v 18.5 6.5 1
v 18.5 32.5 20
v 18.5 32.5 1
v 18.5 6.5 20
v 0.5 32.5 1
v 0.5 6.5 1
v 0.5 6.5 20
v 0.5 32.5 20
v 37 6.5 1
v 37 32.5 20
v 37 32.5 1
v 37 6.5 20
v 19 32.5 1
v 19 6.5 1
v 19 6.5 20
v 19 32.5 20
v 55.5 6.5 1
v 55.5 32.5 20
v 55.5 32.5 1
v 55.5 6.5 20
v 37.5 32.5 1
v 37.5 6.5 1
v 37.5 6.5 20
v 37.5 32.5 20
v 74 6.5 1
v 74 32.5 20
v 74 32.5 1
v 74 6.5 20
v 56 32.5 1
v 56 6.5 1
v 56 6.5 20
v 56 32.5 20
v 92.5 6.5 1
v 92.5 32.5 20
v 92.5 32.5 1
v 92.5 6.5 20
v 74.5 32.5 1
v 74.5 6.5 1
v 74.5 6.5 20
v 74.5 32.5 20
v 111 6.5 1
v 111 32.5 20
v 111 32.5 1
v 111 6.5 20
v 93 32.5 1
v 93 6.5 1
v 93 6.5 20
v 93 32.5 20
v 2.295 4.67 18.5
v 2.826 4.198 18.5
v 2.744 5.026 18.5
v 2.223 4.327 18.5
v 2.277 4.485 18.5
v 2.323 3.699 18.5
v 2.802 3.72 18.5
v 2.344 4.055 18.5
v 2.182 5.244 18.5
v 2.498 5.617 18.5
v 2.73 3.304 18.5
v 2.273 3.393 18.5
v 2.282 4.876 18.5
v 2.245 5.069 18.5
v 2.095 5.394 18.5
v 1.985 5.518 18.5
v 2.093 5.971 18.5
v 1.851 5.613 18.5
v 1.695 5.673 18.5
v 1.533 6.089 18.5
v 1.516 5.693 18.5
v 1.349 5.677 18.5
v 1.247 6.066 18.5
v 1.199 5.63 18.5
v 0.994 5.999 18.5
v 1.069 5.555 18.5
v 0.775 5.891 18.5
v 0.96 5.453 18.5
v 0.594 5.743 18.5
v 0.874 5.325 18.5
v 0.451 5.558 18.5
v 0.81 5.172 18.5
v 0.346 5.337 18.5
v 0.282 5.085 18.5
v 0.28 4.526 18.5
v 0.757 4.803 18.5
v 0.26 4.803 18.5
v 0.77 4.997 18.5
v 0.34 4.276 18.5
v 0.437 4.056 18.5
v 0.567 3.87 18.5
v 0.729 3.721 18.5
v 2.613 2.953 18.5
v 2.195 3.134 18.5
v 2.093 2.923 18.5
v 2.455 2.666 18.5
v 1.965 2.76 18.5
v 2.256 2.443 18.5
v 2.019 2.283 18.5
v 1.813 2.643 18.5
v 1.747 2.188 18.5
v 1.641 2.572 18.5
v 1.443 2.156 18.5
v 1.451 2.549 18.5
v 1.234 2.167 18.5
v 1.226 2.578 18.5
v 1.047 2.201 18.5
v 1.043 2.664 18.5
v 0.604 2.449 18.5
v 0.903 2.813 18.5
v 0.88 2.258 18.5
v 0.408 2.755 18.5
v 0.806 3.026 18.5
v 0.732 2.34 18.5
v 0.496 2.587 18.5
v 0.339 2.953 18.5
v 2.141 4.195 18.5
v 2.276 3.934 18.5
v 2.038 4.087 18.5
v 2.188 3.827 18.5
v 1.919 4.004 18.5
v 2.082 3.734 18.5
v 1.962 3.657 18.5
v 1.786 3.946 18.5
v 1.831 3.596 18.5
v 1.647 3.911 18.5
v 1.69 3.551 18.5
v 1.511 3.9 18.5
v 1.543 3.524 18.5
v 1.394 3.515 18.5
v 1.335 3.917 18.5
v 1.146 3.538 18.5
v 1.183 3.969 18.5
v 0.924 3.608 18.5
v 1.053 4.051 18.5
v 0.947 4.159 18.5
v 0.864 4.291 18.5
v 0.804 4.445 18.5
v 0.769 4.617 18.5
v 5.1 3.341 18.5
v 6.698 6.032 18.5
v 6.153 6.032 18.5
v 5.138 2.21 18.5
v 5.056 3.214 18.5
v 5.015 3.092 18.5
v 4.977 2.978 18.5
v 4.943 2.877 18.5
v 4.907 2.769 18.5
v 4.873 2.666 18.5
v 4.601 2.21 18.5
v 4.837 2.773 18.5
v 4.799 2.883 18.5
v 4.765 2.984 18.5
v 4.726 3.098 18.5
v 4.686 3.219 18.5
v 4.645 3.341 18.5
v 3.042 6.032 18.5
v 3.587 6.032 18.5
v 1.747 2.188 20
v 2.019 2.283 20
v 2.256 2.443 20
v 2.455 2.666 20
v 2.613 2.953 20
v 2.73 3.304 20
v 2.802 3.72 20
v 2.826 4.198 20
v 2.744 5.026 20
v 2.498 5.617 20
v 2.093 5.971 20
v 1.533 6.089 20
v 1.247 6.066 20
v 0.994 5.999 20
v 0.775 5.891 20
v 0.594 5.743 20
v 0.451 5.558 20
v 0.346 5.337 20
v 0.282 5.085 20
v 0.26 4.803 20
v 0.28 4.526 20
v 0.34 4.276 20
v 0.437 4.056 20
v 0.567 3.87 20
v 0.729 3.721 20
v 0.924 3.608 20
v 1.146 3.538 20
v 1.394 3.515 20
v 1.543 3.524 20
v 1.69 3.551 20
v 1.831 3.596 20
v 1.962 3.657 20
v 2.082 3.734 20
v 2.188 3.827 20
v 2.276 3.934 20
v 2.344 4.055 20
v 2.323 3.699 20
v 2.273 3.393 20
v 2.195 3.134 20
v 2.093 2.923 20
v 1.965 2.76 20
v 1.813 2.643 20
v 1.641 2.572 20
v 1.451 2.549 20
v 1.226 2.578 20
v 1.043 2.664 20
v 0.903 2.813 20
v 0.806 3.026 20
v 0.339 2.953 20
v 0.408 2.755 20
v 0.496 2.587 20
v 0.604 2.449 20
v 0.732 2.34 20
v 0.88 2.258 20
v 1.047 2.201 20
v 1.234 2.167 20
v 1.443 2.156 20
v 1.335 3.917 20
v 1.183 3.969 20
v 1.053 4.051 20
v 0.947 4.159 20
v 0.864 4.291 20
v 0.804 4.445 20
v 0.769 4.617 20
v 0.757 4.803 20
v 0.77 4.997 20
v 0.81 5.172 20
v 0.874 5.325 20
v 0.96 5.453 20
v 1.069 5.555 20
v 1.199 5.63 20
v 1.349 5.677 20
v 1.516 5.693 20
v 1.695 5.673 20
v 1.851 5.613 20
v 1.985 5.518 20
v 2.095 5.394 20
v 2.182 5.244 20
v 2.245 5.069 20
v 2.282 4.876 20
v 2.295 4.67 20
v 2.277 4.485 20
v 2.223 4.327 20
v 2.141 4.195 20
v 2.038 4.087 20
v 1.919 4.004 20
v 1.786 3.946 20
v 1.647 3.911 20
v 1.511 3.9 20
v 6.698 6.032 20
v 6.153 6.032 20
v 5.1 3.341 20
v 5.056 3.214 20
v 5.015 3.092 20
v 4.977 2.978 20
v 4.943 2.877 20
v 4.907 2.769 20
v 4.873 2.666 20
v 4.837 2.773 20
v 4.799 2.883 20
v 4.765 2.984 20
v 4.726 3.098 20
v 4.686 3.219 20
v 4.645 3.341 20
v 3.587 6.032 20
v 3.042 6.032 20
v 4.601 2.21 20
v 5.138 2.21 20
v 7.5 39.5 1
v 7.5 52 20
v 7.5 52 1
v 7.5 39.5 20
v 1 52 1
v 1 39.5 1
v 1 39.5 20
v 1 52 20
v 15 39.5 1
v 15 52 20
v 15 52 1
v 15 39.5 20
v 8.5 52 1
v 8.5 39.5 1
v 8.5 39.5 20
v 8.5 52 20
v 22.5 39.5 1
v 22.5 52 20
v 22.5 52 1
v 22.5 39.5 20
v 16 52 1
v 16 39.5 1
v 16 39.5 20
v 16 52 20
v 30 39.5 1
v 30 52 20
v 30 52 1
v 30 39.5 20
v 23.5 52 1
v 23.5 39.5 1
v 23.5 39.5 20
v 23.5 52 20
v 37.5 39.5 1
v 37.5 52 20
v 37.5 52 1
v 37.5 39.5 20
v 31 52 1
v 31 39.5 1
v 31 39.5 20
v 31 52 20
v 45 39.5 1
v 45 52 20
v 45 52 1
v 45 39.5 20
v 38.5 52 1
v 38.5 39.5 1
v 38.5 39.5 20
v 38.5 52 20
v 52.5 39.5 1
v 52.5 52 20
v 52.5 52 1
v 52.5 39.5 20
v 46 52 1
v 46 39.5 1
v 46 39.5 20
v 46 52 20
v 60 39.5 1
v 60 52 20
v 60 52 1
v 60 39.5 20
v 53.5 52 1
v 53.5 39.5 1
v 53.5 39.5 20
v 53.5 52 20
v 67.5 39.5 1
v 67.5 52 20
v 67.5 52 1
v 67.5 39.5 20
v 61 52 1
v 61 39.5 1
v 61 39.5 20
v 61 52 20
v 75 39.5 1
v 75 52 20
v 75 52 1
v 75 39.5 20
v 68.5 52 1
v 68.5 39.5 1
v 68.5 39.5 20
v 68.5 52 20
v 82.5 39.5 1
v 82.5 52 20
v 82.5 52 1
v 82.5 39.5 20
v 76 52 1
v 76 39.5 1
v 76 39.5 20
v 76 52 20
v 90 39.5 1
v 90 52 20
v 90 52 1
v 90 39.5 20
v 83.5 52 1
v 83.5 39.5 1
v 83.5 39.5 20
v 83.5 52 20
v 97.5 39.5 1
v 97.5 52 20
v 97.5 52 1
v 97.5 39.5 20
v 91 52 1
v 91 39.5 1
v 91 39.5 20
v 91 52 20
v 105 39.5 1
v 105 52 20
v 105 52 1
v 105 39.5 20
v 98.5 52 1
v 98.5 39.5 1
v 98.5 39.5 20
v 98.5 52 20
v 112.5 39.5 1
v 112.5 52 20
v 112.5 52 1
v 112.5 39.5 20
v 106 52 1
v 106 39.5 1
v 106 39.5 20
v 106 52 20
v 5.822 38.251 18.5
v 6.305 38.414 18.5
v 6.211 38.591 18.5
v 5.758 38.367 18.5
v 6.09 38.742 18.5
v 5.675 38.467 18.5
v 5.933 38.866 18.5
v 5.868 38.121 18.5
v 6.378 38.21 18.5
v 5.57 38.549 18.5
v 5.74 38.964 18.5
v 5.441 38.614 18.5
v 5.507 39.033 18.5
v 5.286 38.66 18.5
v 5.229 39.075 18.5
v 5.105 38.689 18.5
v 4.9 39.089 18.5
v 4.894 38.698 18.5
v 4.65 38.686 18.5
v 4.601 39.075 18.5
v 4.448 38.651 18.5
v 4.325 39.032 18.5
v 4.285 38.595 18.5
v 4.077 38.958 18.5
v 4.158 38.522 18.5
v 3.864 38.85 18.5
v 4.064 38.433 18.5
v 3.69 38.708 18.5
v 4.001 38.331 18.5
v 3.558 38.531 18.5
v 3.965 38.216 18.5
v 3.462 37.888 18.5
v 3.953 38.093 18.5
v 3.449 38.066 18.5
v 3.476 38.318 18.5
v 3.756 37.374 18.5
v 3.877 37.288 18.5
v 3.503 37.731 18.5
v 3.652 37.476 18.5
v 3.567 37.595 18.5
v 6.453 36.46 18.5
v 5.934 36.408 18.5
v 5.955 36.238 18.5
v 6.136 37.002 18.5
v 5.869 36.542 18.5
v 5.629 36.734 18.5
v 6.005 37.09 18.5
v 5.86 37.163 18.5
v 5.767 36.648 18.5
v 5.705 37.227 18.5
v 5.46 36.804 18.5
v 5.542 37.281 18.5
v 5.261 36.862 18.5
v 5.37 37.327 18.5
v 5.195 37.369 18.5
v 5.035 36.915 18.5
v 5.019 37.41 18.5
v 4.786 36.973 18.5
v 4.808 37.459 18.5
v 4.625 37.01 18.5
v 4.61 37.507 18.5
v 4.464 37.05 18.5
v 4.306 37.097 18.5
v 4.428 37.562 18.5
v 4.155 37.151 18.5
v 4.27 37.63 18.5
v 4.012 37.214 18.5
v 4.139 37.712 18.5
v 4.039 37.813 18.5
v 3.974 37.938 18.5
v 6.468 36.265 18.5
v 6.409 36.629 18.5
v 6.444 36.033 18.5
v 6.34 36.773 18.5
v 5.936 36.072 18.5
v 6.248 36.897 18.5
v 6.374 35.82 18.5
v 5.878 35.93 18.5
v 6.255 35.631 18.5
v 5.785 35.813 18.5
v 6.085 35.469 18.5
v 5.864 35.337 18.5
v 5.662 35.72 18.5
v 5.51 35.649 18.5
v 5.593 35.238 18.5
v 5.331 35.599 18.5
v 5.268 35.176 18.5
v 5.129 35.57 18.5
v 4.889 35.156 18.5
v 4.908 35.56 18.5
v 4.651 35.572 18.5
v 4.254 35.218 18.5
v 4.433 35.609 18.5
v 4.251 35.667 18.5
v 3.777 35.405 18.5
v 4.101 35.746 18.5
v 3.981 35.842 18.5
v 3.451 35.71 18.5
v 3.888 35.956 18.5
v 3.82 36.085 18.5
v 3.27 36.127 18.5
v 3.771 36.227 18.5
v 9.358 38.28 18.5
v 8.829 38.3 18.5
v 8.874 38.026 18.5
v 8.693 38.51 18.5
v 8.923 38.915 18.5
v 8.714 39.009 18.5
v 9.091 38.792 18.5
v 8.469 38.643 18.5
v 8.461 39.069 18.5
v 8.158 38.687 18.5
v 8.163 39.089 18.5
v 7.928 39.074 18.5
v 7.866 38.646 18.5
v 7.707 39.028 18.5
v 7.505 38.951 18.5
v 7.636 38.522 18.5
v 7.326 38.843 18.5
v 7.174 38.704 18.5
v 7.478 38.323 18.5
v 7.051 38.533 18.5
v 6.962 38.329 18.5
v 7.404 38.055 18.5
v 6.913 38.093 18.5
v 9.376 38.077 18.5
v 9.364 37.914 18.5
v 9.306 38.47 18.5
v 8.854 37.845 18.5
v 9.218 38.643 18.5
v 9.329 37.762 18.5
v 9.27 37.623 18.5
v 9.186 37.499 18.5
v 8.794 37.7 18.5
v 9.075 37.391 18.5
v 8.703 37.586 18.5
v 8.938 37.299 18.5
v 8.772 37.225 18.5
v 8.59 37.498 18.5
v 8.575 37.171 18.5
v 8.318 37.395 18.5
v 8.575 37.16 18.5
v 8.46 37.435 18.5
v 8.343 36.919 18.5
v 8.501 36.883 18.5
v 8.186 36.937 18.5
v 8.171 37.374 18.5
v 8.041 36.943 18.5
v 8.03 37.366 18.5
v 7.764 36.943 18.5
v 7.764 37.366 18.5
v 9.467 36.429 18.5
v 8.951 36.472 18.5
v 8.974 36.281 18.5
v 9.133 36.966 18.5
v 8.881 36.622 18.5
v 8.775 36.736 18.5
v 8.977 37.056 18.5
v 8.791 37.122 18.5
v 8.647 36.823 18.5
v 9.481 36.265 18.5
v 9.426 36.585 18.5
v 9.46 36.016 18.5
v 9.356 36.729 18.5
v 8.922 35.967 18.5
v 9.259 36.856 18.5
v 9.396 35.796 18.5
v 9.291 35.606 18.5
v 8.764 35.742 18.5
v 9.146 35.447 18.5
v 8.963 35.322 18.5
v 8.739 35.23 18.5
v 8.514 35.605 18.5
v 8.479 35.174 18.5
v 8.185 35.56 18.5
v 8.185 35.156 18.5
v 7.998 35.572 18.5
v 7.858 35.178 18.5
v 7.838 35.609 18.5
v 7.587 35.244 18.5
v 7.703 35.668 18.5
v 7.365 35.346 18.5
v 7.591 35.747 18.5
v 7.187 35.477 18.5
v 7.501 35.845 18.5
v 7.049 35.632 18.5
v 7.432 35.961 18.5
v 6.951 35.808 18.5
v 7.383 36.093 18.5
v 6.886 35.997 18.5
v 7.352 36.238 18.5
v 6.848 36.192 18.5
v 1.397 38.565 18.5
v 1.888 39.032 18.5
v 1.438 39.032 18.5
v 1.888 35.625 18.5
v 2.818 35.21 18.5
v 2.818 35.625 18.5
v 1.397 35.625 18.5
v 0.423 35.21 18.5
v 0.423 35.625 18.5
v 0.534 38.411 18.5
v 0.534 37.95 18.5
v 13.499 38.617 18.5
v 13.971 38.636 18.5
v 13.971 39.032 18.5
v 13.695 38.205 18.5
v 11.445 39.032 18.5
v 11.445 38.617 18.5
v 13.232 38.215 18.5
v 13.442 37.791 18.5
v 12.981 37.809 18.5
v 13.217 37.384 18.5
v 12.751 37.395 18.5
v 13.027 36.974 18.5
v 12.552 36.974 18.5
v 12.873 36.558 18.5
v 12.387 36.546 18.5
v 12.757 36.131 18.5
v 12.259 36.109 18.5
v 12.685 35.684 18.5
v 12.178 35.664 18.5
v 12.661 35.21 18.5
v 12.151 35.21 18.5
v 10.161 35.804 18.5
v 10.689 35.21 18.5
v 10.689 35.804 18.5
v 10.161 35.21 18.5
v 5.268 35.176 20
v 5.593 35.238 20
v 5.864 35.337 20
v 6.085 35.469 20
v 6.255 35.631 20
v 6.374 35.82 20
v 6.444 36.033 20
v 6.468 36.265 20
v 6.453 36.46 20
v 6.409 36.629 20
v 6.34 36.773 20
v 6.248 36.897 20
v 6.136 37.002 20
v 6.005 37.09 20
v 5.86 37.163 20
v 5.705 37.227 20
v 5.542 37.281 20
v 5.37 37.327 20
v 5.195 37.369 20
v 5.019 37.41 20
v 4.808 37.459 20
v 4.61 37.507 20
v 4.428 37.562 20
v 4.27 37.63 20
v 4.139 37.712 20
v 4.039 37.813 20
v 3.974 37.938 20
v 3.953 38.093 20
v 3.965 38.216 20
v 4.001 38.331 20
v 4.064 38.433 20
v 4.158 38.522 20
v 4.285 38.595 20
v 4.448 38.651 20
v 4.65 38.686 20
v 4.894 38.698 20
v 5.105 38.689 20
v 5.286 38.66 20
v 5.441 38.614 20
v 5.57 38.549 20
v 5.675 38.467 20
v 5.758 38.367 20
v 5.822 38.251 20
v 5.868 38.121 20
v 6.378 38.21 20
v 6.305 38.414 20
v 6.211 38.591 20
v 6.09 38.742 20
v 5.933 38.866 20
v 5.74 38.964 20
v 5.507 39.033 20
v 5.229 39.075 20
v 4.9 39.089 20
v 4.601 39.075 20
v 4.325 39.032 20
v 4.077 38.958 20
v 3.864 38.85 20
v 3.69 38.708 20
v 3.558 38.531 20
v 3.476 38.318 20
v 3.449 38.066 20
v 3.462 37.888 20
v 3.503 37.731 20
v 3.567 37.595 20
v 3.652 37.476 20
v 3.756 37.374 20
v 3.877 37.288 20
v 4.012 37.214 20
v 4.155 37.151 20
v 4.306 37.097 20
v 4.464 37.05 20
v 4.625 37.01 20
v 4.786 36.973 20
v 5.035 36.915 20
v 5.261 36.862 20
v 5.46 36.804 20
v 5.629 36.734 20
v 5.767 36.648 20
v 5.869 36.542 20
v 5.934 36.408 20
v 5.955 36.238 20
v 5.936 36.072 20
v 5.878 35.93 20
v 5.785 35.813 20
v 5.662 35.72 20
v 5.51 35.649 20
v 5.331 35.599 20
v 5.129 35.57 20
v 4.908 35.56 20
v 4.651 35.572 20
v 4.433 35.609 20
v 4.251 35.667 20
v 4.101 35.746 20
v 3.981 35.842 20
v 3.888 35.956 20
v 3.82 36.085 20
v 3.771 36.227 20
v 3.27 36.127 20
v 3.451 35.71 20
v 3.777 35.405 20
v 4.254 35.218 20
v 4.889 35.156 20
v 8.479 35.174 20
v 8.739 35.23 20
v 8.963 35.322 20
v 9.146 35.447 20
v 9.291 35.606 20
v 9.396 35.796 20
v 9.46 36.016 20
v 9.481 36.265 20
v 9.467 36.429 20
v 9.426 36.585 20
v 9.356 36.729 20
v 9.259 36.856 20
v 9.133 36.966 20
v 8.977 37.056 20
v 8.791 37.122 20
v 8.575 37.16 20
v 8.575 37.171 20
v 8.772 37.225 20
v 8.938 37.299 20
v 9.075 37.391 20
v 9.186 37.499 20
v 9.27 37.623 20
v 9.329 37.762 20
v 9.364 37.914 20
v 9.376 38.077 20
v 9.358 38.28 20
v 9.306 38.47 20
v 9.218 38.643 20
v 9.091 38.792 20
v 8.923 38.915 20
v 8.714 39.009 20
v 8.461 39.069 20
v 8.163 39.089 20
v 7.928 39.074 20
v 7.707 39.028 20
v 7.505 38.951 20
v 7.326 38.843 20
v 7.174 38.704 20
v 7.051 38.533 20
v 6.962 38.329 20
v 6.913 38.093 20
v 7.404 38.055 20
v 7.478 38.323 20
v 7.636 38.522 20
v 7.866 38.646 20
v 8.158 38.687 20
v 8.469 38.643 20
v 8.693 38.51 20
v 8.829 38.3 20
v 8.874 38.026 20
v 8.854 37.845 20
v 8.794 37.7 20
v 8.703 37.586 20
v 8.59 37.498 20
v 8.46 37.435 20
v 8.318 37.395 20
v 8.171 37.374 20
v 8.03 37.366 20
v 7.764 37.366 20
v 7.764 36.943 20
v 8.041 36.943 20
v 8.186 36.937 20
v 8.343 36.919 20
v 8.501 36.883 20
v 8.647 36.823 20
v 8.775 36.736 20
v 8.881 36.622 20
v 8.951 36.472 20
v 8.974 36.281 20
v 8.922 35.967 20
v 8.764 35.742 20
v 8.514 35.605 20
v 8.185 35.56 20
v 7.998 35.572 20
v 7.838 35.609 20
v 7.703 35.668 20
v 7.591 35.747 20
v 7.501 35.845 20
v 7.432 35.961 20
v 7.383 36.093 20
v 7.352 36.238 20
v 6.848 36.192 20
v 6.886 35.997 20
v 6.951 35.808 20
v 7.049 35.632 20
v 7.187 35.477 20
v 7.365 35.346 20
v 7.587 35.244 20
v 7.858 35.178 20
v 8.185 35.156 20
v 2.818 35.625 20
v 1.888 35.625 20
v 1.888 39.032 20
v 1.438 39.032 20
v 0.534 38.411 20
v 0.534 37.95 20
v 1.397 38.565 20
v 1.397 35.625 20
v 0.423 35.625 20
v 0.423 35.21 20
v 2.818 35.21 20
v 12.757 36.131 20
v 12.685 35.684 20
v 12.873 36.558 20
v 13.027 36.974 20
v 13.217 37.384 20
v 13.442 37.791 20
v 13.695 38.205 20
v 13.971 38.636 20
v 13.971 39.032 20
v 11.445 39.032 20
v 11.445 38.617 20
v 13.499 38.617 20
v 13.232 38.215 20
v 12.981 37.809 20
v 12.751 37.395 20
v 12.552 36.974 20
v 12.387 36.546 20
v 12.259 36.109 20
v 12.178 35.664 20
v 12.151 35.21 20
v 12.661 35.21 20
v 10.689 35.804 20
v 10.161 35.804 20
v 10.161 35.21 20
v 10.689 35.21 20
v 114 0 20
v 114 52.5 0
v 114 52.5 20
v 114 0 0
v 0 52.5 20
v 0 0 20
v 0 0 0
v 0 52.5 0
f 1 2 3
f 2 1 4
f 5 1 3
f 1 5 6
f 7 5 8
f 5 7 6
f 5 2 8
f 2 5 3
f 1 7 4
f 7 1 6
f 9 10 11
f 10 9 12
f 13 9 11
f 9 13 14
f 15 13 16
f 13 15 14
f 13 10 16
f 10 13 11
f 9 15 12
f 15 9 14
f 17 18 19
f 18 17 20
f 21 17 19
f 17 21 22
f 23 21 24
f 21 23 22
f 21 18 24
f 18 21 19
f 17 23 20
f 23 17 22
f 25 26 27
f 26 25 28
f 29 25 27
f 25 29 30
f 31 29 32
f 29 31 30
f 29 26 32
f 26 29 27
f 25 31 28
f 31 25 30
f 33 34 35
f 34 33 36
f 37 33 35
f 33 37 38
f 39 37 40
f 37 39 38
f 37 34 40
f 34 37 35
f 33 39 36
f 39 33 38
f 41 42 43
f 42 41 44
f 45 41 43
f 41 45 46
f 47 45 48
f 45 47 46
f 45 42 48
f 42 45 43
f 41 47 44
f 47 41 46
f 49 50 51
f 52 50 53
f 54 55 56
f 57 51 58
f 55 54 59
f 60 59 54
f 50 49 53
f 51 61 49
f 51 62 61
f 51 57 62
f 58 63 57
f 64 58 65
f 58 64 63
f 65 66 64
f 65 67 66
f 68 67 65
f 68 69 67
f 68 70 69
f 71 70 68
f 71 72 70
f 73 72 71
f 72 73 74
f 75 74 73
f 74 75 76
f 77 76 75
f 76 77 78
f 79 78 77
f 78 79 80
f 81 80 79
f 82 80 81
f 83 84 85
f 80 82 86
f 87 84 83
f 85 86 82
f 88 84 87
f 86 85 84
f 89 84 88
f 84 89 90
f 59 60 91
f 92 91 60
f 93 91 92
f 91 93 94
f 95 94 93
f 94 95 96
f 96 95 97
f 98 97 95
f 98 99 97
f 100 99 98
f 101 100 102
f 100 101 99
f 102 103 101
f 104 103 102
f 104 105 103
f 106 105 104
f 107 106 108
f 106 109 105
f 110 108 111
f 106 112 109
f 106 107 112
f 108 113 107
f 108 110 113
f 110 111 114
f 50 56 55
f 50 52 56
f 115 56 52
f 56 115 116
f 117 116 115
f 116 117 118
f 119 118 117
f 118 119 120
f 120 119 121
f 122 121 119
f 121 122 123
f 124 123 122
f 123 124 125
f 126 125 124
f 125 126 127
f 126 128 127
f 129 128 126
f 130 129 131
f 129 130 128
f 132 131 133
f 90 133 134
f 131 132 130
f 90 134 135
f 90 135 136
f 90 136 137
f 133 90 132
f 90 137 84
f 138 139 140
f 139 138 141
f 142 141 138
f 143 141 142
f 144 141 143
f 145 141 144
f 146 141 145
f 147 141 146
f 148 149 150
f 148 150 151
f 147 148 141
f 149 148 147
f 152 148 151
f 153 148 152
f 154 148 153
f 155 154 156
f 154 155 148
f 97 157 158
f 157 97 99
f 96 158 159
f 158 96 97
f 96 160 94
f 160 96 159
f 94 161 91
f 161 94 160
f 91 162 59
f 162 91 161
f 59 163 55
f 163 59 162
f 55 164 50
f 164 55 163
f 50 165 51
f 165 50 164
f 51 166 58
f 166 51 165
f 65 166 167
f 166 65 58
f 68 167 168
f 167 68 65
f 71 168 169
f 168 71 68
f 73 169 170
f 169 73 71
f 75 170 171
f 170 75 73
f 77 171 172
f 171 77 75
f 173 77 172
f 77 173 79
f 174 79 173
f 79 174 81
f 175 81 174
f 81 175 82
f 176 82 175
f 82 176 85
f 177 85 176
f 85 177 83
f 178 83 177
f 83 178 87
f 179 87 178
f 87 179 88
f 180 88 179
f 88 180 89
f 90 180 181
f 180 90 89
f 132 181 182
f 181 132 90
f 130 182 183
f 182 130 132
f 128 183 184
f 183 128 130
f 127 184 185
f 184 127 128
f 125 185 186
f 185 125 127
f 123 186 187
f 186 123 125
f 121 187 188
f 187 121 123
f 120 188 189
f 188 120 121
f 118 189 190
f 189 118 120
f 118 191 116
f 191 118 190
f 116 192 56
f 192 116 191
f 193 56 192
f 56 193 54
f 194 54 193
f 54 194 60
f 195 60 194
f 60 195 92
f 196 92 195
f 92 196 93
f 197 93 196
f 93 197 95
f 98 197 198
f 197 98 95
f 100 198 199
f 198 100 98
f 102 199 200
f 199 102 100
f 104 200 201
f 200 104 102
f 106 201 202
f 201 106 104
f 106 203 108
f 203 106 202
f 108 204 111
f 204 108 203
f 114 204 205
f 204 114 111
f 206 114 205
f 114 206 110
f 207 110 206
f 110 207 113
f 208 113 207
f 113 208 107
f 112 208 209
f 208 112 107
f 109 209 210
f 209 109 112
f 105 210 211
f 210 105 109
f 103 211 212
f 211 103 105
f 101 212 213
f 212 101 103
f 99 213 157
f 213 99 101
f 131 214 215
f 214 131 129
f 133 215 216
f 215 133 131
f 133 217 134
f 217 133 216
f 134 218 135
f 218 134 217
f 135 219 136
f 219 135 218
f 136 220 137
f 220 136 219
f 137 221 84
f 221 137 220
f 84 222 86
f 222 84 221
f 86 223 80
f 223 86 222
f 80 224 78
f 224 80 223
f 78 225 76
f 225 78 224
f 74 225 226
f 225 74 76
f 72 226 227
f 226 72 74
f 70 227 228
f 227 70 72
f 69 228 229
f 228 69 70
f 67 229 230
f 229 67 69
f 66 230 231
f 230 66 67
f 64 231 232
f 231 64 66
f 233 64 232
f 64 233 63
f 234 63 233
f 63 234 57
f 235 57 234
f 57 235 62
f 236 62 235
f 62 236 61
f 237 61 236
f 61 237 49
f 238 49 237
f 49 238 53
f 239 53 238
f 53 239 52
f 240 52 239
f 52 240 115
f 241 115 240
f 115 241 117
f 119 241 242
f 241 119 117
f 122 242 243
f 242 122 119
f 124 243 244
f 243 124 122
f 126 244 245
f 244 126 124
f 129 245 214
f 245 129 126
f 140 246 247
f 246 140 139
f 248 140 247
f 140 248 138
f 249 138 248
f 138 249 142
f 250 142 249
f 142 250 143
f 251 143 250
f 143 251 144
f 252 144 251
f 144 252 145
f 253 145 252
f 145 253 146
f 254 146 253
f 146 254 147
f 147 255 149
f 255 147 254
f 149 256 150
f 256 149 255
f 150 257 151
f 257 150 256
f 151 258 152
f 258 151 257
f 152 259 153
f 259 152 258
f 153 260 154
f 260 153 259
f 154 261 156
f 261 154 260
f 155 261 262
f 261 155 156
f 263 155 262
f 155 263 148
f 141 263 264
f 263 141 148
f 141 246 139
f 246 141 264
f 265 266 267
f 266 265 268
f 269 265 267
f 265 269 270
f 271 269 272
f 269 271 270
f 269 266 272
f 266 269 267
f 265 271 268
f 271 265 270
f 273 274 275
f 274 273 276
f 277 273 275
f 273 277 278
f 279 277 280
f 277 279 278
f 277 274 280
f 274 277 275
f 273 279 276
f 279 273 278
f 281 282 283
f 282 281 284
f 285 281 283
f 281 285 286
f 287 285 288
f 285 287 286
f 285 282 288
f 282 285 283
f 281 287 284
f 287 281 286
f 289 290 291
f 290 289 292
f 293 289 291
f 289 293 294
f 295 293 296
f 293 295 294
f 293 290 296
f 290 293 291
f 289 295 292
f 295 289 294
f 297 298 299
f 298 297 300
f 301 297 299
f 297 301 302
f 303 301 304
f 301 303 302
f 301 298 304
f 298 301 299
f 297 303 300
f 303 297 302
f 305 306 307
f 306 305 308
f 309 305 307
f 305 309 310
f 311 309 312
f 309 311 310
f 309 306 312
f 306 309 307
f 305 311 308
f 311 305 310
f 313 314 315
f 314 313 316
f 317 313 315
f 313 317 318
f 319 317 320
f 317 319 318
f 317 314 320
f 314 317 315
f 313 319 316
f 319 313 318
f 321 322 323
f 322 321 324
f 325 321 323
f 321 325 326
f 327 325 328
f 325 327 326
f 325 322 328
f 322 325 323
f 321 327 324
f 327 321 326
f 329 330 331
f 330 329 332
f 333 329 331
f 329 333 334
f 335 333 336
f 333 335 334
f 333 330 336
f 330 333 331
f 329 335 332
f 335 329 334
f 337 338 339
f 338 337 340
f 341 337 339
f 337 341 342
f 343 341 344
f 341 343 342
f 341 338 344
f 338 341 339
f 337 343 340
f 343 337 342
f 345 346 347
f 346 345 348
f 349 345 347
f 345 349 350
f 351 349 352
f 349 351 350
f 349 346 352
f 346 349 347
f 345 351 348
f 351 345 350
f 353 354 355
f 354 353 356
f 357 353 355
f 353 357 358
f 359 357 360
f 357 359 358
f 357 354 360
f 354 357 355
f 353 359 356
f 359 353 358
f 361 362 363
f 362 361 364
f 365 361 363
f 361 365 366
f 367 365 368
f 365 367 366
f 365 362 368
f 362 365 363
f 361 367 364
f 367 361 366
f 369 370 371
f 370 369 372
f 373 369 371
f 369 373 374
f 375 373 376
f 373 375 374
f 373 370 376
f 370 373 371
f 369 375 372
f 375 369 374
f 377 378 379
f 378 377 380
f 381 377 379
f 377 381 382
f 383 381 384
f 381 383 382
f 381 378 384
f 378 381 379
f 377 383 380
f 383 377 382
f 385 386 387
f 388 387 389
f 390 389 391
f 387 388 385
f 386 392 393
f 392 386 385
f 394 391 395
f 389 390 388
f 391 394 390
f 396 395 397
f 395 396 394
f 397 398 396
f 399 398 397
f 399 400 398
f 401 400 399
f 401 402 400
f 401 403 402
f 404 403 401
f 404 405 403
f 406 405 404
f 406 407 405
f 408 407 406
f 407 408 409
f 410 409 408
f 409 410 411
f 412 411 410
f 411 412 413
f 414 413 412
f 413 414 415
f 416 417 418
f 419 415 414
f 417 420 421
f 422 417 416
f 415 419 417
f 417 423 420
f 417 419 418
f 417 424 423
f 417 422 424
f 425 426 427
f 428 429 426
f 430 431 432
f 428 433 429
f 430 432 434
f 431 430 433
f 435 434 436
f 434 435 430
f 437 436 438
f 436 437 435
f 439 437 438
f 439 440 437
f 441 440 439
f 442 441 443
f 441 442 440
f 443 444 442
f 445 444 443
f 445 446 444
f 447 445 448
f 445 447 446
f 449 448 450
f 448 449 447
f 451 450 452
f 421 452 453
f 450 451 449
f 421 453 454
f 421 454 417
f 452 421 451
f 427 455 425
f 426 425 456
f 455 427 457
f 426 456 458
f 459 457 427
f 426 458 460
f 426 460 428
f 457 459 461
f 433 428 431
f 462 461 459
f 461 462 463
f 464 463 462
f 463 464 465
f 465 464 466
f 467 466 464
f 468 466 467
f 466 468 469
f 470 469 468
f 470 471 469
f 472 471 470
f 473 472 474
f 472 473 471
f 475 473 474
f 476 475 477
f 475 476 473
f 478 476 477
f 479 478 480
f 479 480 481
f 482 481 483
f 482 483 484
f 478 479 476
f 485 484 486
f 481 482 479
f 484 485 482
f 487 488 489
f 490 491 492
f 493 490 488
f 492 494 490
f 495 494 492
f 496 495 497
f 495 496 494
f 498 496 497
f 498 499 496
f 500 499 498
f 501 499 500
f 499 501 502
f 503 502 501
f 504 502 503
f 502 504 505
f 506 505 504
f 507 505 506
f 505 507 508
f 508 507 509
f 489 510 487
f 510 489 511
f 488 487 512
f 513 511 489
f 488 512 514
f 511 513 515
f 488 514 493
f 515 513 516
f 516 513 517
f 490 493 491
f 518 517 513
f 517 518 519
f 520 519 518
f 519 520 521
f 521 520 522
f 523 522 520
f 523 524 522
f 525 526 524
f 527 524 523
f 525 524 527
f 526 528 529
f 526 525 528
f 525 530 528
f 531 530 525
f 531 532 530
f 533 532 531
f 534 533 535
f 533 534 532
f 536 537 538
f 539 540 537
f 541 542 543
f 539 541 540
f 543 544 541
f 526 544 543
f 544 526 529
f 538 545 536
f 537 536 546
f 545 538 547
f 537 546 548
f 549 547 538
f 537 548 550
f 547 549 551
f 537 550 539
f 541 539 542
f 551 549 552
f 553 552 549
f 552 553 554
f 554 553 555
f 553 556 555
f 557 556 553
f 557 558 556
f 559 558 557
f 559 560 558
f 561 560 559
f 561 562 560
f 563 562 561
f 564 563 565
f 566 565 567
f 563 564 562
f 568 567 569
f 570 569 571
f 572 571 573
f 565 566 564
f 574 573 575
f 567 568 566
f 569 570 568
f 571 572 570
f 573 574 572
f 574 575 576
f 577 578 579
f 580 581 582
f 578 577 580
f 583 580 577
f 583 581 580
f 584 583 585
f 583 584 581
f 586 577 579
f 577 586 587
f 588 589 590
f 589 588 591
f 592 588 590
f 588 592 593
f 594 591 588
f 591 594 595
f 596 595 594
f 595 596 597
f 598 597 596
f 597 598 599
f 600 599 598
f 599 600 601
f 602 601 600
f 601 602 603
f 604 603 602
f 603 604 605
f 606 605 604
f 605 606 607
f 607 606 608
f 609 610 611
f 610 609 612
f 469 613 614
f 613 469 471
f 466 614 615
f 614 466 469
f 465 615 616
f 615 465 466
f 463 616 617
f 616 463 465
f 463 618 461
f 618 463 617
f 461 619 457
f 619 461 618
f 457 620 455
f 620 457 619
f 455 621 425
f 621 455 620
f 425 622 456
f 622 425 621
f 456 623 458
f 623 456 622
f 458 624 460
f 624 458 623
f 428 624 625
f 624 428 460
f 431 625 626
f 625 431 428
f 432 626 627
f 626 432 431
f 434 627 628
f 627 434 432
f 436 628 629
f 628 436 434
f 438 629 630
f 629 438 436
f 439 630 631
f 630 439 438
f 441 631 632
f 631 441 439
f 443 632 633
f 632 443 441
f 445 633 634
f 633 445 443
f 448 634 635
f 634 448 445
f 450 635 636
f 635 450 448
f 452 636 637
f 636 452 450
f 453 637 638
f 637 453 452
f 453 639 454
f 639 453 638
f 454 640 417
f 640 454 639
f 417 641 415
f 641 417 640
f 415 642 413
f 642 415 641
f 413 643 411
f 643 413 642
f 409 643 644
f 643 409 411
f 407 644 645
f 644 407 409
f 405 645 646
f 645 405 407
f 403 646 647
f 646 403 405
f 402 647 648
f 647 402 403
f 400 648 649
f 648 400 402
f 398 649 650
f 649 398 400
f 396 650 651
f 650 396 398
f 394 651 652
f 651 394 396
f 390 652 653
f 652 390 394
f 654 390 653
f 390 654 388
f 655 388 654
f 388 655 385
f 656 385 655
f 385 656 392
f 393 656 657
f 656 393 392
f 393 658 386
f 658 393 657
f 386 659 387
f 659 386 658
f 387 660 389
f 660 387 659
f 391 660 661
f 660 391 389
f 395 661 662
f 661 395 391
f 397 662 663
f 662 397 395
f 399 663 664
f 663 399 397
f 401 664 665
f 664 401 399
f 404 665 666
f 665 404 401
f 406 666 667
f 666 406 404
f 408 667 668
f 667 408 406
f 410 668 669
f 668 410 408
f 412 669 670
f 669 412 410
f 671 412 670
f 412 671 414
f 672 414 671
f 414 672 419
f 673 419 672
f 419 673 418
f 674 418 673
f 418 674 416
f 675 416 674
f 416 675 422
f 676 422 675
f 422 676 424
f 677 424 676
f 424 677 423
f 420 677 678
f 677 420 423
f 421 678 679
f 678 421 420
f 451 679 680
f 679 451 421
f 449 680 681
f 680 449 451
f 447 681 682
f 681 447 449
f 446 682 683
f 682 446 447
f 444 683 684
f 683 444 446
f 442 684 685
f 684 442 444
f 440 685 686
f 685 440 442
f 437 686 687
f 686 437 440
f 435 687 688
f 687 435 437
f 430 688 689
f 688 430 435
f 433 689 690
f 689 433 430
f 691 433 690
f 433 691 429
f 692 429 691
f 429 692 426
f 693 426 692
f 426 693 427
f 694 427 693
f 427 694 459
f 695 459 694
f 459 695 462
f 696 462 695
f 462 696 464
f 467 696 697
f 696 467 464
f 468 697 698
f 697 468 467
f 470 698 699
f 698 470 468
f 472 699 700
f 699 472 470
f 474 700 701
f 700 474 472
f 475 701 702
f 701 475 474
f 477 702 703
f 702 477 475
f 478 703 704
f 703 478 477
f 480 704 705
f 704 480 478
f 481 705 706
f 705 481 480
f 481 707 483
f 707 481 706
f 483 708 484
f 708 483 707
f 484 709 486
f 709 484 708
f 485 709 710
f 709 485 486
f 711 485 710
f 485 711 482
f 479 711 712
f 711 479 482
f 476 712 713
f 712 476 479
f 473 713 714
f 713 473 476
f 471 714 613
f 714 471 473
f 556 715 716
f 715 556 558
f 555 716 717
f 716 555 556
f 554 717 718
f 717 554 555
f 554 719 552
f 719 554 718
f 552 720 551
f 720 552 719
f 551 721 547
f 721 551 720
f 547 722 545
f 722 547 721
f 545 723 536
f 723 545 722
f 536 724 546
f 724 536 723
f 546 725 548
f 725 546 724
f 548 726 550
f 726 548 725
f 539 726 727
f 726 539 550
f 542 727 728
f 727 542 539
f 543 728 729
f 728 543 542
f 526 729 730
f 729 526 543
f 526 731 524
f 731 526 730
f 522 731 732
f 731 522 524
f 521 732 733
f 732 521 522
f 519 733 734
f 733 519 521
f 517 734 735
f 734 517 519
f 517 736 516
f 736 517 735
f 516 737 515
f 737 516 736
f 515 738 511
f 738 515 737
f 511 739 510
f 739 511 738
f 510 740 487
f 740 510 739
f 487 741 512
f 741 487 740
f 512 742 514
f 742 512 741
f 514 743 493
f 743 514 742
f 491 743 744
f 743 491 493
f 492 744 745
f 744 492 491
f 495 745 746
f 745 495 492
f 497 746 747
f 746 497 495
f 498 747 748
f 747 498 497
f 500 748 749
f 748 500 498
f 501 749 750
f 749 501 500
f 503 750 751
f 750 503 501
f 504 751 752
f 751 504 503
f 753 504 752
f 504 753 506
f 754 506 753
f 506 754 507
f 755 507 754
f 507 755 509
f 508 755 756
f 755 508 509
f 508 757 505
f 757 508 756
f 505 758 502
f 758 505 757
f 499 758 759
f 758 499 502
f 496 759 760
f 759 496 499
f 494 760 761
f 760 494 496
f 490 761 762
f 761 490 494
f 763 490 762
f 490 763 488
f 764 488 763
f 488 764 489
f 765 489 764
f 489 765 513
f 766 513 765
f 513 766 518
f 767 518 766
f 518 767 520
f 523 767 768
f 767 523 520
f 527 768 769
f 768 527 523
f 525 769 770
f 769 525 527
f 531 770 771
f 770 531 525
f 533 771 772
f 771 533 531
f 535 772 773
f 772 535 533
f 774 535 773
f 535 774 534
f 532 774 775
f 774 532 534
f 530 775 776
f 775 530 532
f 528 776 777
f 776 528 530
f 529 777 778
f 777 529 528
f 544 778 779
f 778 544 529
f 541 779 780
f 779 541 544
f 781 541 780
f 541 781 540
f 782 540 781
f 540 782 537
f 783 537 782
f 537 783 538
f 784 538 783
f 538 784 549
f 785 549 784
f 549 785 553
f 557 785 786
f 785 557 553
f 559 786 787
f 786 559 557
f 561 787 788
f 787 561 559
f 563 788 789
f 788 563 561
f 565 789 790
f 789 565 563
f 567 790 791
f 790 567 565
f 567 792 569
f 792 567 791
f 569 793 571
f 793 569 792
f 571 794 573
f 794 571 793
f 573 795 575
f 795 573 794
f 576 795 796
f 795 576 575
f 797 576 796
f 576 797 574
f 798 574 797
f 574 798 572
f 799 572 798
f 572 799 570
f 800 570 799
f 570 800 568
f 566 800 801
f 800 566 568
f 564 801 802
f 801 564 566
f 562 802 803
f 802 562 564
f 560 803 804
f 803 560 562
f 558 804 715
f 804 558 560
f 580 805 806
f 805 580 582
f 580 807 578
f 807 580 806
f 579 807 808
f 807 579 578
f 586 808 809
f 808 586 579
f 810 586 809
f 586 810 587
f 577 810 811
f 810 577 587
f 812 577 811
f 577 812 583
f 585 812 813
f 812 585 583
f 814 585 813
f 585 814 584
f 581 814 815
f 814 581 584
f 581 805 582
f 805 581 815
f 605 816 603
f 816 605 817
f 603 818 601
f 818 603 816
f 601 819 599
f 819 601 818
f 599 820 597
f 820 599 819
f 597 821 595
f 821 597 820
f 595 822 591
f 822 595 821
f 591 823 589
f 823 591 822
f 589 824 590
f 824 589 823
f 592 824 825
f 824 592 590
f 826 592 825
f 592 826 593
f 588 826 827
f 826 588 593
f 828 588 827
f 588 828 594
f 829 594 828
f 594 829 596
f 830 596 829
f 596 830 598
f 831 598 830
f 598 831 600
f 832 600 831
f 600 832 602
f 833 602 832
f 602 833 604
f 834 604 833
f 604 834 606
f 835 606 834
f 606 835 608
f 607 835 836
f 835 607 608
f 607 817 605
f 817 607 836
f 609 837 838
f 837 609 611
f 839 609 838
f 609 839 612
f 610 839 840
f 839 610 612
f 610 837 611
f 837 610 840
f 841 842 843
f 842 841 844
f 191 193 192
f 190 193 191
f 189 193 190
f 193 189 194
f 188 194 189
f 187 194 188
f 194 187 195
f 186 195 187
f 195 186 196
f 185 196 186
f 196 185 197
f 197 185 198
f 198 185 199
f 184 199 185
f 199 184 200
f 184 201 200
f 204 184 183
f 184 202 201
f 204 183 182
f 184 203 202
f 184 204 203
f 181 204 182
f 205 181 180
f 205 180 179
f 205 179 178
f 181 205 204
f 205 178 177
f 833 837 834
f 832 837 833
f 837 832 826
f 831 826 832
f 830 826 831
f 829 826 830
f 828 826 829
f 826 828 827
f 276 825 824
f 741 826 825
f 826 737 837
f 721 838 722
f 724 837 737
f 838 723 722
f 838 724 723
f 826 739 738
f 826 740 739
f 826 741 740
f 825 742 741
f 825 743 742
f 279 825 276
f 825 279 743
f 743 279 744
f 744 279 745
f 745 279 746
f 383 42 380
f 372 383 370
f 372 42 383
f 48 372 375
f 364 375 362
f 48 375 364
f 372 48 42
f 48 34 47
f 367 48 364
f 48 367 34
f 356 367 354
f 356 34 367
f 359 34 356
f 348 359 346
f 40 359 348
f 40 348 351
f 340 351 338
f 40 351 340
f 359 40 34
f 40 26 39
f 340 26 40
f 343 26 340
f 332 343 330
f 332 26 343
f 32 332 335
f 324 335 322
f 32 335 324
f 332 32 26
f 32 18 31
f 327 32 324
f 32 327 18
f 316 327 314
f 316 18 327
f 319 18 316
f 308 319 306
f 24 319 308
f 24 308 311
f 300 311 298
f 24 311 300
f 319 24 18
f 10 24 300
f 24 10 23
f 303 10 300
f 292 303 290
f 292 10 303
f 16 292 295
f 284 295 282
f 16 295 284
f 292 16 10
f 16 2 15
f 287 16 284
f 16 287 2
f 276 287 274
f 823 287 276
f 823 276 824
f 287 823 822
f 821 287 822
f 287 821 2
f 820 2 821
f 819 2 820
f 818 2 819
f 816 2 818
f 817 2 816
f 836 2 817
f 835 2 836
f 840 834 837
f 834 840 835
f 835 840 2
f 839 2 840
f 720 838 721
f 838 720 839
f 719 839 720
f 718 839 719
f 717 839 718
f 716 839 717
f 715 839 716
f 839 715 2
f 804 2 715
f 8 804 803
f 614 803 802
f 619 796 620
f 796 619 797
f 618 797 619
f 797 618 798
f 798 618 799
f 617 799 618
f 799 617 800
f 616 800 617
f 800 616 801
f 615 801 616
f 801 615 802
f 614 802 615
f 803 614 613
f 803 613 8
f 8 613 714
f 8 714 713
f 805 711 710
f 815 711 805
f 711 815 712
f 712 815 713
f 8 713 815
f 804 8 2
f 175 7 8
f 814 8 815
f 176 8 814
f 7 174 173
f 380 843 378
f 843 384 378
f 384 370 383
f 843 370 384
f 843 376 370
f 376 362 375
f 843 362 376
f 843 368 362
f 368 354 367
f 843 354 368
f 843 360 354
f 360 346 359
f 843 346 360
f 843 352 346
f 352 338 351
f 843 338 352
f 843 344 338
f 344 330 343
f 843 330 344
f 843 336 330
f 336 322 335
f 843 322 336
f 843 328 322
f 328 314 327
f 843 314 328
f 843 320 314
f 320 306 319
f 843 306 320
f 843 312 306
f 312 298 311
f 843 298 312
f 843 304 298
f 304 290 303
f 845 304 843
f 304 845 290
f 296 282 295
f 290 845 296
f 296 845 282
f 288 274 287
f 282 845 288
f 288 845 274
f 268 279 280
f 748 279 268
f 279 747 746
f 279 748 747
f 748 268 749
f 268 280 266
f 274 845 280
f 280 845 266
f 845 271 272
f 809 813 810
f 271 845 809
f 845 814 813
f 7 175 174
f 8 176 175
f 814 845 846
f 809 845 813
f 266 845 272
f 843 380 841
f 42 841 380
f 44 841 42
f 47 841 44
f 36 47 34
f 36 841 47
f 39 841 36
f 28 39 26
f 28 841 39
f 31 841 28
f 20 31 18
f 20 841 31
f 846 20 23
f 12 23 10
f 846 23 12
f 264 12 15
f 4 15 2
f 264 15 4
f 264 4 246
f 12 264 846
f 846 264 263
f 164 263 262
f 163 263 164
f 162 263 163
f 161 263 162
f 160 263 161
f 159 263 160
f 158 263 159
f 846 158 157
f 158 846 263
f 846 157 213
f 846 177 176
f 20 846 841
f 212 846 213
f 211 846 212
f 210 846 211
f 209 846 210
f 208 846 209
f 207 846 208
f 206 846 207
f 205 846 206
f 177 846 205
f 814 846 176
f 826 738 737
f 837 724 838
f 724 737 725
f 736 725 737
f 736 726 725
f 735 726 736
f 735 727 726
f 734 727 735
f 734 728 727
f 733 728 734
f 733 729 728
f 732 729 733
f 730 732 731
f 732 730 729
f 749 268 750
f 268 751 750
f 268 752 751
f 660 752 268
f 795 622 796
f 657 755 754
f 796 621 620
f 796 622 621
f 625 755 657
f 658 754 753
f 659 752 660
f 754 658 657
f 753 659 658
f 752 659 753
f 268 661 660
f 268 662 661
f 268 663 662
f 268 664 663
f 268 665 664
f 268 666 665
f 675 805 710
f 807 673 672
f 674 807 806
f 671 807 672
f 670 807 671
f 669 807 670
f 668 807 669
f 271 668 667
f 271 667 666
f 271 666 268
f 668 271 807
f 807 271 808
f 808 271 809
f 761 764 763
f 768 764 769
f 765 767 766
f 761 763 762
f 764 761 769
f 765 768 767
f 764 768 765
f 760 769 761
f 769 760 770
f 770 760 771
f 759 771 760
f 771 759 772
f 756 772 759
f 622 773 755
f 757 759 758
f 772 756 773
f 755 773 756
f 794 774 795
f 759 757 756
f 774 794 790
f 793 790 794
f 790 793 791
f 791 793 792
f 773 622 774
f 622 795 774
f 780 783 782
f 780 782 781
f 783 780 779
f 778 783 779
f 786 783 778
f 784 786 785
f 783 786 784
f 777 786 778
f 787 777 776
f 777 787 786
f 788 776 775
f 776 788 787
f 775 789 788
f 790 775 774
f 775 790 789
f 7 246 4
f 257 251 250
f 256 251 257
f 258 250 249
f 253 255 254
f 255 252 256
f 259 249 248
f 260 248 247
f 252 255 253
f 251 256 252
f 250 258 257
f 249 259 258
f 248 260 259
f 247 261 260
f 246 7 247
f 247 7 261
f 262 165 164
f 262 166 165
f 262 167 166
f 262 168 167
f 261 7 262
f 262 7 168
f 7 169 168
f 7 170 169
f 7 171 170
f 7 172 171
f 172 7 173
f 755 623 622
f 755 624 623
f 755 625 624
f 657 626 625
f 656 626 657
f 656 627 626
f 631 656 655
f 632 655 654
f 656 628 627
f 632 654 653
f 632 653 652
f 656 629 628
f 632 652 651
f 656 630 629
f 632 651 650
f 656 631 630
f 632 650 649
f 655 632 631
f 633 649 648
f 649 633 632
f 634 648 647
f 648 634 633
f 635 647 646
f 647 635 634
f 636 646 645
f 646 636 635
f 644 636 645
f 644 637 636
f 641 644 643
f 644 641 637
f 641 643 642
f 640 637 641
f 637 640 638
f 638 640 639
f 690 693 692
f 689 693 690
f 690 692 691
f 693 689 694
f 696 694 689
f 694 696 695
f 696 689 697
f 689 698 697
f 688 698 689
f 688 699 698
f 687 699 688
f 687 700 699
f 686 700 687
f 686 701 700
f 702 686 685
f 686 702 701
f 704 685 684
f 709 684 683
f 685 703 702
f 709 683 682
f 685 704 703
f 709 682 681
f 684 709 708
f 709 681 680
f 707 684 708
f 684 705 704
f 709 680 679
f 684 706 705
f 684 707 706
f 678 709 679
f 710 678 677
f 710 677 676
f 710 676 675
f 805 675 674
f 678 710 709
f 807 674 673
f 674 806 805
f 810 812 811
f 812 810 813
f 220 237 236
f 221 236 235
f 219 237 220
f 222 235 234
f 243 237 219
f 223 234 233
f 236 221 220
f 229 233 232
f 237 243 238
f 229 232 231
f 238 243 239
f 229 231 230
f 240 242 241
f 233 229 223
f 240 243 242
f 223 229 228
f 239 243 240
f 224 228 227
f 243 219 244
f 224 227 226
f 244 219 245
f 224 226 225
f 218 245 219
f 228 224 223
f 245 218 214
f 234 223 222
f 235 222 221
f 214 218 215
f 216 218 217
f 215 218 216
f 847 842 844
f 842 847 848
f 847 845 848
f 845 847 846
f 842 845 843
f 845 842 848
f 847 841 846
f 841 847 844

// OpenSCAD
// název, díra, obvod
batteries=[
["9V",[18,26,20],[18.5,26.5]],
["1S3.7",[6.5,12.5,20],[7.5,13]]
];

width=114;

space = 7;

function height(i) = batteries[i][1][1] + space + ( i>0 ? height(i-1) : 0 );

function maxsize(i) = max(batteries[i][1][2], (i>0 ? maxsize(i-1) : 0));

module row(battery) {
    translate([0,space-battery[2][1]+battery[1][1],-1.5]) linear_extrude(3) text(battery[0], size=space-3, valign="top");
    for(i=[0:(battery[2][0]):(width-battery[2][0])]){
        translate([i+battery[2][0]-battery[1][0],space,-battery[1][2]+1]) cube(battery[1]);
    }
}

difference() {
    height = maxsize(len(batteries)-1);
    cube([width, height(len(batteries)-1), height]);
    for (i = [0:len(batteries)-1]) {
        battery = batteries[i];
        translate([0, height(i)-battery[2][1]-space, height])  row(battery);
    }
}
